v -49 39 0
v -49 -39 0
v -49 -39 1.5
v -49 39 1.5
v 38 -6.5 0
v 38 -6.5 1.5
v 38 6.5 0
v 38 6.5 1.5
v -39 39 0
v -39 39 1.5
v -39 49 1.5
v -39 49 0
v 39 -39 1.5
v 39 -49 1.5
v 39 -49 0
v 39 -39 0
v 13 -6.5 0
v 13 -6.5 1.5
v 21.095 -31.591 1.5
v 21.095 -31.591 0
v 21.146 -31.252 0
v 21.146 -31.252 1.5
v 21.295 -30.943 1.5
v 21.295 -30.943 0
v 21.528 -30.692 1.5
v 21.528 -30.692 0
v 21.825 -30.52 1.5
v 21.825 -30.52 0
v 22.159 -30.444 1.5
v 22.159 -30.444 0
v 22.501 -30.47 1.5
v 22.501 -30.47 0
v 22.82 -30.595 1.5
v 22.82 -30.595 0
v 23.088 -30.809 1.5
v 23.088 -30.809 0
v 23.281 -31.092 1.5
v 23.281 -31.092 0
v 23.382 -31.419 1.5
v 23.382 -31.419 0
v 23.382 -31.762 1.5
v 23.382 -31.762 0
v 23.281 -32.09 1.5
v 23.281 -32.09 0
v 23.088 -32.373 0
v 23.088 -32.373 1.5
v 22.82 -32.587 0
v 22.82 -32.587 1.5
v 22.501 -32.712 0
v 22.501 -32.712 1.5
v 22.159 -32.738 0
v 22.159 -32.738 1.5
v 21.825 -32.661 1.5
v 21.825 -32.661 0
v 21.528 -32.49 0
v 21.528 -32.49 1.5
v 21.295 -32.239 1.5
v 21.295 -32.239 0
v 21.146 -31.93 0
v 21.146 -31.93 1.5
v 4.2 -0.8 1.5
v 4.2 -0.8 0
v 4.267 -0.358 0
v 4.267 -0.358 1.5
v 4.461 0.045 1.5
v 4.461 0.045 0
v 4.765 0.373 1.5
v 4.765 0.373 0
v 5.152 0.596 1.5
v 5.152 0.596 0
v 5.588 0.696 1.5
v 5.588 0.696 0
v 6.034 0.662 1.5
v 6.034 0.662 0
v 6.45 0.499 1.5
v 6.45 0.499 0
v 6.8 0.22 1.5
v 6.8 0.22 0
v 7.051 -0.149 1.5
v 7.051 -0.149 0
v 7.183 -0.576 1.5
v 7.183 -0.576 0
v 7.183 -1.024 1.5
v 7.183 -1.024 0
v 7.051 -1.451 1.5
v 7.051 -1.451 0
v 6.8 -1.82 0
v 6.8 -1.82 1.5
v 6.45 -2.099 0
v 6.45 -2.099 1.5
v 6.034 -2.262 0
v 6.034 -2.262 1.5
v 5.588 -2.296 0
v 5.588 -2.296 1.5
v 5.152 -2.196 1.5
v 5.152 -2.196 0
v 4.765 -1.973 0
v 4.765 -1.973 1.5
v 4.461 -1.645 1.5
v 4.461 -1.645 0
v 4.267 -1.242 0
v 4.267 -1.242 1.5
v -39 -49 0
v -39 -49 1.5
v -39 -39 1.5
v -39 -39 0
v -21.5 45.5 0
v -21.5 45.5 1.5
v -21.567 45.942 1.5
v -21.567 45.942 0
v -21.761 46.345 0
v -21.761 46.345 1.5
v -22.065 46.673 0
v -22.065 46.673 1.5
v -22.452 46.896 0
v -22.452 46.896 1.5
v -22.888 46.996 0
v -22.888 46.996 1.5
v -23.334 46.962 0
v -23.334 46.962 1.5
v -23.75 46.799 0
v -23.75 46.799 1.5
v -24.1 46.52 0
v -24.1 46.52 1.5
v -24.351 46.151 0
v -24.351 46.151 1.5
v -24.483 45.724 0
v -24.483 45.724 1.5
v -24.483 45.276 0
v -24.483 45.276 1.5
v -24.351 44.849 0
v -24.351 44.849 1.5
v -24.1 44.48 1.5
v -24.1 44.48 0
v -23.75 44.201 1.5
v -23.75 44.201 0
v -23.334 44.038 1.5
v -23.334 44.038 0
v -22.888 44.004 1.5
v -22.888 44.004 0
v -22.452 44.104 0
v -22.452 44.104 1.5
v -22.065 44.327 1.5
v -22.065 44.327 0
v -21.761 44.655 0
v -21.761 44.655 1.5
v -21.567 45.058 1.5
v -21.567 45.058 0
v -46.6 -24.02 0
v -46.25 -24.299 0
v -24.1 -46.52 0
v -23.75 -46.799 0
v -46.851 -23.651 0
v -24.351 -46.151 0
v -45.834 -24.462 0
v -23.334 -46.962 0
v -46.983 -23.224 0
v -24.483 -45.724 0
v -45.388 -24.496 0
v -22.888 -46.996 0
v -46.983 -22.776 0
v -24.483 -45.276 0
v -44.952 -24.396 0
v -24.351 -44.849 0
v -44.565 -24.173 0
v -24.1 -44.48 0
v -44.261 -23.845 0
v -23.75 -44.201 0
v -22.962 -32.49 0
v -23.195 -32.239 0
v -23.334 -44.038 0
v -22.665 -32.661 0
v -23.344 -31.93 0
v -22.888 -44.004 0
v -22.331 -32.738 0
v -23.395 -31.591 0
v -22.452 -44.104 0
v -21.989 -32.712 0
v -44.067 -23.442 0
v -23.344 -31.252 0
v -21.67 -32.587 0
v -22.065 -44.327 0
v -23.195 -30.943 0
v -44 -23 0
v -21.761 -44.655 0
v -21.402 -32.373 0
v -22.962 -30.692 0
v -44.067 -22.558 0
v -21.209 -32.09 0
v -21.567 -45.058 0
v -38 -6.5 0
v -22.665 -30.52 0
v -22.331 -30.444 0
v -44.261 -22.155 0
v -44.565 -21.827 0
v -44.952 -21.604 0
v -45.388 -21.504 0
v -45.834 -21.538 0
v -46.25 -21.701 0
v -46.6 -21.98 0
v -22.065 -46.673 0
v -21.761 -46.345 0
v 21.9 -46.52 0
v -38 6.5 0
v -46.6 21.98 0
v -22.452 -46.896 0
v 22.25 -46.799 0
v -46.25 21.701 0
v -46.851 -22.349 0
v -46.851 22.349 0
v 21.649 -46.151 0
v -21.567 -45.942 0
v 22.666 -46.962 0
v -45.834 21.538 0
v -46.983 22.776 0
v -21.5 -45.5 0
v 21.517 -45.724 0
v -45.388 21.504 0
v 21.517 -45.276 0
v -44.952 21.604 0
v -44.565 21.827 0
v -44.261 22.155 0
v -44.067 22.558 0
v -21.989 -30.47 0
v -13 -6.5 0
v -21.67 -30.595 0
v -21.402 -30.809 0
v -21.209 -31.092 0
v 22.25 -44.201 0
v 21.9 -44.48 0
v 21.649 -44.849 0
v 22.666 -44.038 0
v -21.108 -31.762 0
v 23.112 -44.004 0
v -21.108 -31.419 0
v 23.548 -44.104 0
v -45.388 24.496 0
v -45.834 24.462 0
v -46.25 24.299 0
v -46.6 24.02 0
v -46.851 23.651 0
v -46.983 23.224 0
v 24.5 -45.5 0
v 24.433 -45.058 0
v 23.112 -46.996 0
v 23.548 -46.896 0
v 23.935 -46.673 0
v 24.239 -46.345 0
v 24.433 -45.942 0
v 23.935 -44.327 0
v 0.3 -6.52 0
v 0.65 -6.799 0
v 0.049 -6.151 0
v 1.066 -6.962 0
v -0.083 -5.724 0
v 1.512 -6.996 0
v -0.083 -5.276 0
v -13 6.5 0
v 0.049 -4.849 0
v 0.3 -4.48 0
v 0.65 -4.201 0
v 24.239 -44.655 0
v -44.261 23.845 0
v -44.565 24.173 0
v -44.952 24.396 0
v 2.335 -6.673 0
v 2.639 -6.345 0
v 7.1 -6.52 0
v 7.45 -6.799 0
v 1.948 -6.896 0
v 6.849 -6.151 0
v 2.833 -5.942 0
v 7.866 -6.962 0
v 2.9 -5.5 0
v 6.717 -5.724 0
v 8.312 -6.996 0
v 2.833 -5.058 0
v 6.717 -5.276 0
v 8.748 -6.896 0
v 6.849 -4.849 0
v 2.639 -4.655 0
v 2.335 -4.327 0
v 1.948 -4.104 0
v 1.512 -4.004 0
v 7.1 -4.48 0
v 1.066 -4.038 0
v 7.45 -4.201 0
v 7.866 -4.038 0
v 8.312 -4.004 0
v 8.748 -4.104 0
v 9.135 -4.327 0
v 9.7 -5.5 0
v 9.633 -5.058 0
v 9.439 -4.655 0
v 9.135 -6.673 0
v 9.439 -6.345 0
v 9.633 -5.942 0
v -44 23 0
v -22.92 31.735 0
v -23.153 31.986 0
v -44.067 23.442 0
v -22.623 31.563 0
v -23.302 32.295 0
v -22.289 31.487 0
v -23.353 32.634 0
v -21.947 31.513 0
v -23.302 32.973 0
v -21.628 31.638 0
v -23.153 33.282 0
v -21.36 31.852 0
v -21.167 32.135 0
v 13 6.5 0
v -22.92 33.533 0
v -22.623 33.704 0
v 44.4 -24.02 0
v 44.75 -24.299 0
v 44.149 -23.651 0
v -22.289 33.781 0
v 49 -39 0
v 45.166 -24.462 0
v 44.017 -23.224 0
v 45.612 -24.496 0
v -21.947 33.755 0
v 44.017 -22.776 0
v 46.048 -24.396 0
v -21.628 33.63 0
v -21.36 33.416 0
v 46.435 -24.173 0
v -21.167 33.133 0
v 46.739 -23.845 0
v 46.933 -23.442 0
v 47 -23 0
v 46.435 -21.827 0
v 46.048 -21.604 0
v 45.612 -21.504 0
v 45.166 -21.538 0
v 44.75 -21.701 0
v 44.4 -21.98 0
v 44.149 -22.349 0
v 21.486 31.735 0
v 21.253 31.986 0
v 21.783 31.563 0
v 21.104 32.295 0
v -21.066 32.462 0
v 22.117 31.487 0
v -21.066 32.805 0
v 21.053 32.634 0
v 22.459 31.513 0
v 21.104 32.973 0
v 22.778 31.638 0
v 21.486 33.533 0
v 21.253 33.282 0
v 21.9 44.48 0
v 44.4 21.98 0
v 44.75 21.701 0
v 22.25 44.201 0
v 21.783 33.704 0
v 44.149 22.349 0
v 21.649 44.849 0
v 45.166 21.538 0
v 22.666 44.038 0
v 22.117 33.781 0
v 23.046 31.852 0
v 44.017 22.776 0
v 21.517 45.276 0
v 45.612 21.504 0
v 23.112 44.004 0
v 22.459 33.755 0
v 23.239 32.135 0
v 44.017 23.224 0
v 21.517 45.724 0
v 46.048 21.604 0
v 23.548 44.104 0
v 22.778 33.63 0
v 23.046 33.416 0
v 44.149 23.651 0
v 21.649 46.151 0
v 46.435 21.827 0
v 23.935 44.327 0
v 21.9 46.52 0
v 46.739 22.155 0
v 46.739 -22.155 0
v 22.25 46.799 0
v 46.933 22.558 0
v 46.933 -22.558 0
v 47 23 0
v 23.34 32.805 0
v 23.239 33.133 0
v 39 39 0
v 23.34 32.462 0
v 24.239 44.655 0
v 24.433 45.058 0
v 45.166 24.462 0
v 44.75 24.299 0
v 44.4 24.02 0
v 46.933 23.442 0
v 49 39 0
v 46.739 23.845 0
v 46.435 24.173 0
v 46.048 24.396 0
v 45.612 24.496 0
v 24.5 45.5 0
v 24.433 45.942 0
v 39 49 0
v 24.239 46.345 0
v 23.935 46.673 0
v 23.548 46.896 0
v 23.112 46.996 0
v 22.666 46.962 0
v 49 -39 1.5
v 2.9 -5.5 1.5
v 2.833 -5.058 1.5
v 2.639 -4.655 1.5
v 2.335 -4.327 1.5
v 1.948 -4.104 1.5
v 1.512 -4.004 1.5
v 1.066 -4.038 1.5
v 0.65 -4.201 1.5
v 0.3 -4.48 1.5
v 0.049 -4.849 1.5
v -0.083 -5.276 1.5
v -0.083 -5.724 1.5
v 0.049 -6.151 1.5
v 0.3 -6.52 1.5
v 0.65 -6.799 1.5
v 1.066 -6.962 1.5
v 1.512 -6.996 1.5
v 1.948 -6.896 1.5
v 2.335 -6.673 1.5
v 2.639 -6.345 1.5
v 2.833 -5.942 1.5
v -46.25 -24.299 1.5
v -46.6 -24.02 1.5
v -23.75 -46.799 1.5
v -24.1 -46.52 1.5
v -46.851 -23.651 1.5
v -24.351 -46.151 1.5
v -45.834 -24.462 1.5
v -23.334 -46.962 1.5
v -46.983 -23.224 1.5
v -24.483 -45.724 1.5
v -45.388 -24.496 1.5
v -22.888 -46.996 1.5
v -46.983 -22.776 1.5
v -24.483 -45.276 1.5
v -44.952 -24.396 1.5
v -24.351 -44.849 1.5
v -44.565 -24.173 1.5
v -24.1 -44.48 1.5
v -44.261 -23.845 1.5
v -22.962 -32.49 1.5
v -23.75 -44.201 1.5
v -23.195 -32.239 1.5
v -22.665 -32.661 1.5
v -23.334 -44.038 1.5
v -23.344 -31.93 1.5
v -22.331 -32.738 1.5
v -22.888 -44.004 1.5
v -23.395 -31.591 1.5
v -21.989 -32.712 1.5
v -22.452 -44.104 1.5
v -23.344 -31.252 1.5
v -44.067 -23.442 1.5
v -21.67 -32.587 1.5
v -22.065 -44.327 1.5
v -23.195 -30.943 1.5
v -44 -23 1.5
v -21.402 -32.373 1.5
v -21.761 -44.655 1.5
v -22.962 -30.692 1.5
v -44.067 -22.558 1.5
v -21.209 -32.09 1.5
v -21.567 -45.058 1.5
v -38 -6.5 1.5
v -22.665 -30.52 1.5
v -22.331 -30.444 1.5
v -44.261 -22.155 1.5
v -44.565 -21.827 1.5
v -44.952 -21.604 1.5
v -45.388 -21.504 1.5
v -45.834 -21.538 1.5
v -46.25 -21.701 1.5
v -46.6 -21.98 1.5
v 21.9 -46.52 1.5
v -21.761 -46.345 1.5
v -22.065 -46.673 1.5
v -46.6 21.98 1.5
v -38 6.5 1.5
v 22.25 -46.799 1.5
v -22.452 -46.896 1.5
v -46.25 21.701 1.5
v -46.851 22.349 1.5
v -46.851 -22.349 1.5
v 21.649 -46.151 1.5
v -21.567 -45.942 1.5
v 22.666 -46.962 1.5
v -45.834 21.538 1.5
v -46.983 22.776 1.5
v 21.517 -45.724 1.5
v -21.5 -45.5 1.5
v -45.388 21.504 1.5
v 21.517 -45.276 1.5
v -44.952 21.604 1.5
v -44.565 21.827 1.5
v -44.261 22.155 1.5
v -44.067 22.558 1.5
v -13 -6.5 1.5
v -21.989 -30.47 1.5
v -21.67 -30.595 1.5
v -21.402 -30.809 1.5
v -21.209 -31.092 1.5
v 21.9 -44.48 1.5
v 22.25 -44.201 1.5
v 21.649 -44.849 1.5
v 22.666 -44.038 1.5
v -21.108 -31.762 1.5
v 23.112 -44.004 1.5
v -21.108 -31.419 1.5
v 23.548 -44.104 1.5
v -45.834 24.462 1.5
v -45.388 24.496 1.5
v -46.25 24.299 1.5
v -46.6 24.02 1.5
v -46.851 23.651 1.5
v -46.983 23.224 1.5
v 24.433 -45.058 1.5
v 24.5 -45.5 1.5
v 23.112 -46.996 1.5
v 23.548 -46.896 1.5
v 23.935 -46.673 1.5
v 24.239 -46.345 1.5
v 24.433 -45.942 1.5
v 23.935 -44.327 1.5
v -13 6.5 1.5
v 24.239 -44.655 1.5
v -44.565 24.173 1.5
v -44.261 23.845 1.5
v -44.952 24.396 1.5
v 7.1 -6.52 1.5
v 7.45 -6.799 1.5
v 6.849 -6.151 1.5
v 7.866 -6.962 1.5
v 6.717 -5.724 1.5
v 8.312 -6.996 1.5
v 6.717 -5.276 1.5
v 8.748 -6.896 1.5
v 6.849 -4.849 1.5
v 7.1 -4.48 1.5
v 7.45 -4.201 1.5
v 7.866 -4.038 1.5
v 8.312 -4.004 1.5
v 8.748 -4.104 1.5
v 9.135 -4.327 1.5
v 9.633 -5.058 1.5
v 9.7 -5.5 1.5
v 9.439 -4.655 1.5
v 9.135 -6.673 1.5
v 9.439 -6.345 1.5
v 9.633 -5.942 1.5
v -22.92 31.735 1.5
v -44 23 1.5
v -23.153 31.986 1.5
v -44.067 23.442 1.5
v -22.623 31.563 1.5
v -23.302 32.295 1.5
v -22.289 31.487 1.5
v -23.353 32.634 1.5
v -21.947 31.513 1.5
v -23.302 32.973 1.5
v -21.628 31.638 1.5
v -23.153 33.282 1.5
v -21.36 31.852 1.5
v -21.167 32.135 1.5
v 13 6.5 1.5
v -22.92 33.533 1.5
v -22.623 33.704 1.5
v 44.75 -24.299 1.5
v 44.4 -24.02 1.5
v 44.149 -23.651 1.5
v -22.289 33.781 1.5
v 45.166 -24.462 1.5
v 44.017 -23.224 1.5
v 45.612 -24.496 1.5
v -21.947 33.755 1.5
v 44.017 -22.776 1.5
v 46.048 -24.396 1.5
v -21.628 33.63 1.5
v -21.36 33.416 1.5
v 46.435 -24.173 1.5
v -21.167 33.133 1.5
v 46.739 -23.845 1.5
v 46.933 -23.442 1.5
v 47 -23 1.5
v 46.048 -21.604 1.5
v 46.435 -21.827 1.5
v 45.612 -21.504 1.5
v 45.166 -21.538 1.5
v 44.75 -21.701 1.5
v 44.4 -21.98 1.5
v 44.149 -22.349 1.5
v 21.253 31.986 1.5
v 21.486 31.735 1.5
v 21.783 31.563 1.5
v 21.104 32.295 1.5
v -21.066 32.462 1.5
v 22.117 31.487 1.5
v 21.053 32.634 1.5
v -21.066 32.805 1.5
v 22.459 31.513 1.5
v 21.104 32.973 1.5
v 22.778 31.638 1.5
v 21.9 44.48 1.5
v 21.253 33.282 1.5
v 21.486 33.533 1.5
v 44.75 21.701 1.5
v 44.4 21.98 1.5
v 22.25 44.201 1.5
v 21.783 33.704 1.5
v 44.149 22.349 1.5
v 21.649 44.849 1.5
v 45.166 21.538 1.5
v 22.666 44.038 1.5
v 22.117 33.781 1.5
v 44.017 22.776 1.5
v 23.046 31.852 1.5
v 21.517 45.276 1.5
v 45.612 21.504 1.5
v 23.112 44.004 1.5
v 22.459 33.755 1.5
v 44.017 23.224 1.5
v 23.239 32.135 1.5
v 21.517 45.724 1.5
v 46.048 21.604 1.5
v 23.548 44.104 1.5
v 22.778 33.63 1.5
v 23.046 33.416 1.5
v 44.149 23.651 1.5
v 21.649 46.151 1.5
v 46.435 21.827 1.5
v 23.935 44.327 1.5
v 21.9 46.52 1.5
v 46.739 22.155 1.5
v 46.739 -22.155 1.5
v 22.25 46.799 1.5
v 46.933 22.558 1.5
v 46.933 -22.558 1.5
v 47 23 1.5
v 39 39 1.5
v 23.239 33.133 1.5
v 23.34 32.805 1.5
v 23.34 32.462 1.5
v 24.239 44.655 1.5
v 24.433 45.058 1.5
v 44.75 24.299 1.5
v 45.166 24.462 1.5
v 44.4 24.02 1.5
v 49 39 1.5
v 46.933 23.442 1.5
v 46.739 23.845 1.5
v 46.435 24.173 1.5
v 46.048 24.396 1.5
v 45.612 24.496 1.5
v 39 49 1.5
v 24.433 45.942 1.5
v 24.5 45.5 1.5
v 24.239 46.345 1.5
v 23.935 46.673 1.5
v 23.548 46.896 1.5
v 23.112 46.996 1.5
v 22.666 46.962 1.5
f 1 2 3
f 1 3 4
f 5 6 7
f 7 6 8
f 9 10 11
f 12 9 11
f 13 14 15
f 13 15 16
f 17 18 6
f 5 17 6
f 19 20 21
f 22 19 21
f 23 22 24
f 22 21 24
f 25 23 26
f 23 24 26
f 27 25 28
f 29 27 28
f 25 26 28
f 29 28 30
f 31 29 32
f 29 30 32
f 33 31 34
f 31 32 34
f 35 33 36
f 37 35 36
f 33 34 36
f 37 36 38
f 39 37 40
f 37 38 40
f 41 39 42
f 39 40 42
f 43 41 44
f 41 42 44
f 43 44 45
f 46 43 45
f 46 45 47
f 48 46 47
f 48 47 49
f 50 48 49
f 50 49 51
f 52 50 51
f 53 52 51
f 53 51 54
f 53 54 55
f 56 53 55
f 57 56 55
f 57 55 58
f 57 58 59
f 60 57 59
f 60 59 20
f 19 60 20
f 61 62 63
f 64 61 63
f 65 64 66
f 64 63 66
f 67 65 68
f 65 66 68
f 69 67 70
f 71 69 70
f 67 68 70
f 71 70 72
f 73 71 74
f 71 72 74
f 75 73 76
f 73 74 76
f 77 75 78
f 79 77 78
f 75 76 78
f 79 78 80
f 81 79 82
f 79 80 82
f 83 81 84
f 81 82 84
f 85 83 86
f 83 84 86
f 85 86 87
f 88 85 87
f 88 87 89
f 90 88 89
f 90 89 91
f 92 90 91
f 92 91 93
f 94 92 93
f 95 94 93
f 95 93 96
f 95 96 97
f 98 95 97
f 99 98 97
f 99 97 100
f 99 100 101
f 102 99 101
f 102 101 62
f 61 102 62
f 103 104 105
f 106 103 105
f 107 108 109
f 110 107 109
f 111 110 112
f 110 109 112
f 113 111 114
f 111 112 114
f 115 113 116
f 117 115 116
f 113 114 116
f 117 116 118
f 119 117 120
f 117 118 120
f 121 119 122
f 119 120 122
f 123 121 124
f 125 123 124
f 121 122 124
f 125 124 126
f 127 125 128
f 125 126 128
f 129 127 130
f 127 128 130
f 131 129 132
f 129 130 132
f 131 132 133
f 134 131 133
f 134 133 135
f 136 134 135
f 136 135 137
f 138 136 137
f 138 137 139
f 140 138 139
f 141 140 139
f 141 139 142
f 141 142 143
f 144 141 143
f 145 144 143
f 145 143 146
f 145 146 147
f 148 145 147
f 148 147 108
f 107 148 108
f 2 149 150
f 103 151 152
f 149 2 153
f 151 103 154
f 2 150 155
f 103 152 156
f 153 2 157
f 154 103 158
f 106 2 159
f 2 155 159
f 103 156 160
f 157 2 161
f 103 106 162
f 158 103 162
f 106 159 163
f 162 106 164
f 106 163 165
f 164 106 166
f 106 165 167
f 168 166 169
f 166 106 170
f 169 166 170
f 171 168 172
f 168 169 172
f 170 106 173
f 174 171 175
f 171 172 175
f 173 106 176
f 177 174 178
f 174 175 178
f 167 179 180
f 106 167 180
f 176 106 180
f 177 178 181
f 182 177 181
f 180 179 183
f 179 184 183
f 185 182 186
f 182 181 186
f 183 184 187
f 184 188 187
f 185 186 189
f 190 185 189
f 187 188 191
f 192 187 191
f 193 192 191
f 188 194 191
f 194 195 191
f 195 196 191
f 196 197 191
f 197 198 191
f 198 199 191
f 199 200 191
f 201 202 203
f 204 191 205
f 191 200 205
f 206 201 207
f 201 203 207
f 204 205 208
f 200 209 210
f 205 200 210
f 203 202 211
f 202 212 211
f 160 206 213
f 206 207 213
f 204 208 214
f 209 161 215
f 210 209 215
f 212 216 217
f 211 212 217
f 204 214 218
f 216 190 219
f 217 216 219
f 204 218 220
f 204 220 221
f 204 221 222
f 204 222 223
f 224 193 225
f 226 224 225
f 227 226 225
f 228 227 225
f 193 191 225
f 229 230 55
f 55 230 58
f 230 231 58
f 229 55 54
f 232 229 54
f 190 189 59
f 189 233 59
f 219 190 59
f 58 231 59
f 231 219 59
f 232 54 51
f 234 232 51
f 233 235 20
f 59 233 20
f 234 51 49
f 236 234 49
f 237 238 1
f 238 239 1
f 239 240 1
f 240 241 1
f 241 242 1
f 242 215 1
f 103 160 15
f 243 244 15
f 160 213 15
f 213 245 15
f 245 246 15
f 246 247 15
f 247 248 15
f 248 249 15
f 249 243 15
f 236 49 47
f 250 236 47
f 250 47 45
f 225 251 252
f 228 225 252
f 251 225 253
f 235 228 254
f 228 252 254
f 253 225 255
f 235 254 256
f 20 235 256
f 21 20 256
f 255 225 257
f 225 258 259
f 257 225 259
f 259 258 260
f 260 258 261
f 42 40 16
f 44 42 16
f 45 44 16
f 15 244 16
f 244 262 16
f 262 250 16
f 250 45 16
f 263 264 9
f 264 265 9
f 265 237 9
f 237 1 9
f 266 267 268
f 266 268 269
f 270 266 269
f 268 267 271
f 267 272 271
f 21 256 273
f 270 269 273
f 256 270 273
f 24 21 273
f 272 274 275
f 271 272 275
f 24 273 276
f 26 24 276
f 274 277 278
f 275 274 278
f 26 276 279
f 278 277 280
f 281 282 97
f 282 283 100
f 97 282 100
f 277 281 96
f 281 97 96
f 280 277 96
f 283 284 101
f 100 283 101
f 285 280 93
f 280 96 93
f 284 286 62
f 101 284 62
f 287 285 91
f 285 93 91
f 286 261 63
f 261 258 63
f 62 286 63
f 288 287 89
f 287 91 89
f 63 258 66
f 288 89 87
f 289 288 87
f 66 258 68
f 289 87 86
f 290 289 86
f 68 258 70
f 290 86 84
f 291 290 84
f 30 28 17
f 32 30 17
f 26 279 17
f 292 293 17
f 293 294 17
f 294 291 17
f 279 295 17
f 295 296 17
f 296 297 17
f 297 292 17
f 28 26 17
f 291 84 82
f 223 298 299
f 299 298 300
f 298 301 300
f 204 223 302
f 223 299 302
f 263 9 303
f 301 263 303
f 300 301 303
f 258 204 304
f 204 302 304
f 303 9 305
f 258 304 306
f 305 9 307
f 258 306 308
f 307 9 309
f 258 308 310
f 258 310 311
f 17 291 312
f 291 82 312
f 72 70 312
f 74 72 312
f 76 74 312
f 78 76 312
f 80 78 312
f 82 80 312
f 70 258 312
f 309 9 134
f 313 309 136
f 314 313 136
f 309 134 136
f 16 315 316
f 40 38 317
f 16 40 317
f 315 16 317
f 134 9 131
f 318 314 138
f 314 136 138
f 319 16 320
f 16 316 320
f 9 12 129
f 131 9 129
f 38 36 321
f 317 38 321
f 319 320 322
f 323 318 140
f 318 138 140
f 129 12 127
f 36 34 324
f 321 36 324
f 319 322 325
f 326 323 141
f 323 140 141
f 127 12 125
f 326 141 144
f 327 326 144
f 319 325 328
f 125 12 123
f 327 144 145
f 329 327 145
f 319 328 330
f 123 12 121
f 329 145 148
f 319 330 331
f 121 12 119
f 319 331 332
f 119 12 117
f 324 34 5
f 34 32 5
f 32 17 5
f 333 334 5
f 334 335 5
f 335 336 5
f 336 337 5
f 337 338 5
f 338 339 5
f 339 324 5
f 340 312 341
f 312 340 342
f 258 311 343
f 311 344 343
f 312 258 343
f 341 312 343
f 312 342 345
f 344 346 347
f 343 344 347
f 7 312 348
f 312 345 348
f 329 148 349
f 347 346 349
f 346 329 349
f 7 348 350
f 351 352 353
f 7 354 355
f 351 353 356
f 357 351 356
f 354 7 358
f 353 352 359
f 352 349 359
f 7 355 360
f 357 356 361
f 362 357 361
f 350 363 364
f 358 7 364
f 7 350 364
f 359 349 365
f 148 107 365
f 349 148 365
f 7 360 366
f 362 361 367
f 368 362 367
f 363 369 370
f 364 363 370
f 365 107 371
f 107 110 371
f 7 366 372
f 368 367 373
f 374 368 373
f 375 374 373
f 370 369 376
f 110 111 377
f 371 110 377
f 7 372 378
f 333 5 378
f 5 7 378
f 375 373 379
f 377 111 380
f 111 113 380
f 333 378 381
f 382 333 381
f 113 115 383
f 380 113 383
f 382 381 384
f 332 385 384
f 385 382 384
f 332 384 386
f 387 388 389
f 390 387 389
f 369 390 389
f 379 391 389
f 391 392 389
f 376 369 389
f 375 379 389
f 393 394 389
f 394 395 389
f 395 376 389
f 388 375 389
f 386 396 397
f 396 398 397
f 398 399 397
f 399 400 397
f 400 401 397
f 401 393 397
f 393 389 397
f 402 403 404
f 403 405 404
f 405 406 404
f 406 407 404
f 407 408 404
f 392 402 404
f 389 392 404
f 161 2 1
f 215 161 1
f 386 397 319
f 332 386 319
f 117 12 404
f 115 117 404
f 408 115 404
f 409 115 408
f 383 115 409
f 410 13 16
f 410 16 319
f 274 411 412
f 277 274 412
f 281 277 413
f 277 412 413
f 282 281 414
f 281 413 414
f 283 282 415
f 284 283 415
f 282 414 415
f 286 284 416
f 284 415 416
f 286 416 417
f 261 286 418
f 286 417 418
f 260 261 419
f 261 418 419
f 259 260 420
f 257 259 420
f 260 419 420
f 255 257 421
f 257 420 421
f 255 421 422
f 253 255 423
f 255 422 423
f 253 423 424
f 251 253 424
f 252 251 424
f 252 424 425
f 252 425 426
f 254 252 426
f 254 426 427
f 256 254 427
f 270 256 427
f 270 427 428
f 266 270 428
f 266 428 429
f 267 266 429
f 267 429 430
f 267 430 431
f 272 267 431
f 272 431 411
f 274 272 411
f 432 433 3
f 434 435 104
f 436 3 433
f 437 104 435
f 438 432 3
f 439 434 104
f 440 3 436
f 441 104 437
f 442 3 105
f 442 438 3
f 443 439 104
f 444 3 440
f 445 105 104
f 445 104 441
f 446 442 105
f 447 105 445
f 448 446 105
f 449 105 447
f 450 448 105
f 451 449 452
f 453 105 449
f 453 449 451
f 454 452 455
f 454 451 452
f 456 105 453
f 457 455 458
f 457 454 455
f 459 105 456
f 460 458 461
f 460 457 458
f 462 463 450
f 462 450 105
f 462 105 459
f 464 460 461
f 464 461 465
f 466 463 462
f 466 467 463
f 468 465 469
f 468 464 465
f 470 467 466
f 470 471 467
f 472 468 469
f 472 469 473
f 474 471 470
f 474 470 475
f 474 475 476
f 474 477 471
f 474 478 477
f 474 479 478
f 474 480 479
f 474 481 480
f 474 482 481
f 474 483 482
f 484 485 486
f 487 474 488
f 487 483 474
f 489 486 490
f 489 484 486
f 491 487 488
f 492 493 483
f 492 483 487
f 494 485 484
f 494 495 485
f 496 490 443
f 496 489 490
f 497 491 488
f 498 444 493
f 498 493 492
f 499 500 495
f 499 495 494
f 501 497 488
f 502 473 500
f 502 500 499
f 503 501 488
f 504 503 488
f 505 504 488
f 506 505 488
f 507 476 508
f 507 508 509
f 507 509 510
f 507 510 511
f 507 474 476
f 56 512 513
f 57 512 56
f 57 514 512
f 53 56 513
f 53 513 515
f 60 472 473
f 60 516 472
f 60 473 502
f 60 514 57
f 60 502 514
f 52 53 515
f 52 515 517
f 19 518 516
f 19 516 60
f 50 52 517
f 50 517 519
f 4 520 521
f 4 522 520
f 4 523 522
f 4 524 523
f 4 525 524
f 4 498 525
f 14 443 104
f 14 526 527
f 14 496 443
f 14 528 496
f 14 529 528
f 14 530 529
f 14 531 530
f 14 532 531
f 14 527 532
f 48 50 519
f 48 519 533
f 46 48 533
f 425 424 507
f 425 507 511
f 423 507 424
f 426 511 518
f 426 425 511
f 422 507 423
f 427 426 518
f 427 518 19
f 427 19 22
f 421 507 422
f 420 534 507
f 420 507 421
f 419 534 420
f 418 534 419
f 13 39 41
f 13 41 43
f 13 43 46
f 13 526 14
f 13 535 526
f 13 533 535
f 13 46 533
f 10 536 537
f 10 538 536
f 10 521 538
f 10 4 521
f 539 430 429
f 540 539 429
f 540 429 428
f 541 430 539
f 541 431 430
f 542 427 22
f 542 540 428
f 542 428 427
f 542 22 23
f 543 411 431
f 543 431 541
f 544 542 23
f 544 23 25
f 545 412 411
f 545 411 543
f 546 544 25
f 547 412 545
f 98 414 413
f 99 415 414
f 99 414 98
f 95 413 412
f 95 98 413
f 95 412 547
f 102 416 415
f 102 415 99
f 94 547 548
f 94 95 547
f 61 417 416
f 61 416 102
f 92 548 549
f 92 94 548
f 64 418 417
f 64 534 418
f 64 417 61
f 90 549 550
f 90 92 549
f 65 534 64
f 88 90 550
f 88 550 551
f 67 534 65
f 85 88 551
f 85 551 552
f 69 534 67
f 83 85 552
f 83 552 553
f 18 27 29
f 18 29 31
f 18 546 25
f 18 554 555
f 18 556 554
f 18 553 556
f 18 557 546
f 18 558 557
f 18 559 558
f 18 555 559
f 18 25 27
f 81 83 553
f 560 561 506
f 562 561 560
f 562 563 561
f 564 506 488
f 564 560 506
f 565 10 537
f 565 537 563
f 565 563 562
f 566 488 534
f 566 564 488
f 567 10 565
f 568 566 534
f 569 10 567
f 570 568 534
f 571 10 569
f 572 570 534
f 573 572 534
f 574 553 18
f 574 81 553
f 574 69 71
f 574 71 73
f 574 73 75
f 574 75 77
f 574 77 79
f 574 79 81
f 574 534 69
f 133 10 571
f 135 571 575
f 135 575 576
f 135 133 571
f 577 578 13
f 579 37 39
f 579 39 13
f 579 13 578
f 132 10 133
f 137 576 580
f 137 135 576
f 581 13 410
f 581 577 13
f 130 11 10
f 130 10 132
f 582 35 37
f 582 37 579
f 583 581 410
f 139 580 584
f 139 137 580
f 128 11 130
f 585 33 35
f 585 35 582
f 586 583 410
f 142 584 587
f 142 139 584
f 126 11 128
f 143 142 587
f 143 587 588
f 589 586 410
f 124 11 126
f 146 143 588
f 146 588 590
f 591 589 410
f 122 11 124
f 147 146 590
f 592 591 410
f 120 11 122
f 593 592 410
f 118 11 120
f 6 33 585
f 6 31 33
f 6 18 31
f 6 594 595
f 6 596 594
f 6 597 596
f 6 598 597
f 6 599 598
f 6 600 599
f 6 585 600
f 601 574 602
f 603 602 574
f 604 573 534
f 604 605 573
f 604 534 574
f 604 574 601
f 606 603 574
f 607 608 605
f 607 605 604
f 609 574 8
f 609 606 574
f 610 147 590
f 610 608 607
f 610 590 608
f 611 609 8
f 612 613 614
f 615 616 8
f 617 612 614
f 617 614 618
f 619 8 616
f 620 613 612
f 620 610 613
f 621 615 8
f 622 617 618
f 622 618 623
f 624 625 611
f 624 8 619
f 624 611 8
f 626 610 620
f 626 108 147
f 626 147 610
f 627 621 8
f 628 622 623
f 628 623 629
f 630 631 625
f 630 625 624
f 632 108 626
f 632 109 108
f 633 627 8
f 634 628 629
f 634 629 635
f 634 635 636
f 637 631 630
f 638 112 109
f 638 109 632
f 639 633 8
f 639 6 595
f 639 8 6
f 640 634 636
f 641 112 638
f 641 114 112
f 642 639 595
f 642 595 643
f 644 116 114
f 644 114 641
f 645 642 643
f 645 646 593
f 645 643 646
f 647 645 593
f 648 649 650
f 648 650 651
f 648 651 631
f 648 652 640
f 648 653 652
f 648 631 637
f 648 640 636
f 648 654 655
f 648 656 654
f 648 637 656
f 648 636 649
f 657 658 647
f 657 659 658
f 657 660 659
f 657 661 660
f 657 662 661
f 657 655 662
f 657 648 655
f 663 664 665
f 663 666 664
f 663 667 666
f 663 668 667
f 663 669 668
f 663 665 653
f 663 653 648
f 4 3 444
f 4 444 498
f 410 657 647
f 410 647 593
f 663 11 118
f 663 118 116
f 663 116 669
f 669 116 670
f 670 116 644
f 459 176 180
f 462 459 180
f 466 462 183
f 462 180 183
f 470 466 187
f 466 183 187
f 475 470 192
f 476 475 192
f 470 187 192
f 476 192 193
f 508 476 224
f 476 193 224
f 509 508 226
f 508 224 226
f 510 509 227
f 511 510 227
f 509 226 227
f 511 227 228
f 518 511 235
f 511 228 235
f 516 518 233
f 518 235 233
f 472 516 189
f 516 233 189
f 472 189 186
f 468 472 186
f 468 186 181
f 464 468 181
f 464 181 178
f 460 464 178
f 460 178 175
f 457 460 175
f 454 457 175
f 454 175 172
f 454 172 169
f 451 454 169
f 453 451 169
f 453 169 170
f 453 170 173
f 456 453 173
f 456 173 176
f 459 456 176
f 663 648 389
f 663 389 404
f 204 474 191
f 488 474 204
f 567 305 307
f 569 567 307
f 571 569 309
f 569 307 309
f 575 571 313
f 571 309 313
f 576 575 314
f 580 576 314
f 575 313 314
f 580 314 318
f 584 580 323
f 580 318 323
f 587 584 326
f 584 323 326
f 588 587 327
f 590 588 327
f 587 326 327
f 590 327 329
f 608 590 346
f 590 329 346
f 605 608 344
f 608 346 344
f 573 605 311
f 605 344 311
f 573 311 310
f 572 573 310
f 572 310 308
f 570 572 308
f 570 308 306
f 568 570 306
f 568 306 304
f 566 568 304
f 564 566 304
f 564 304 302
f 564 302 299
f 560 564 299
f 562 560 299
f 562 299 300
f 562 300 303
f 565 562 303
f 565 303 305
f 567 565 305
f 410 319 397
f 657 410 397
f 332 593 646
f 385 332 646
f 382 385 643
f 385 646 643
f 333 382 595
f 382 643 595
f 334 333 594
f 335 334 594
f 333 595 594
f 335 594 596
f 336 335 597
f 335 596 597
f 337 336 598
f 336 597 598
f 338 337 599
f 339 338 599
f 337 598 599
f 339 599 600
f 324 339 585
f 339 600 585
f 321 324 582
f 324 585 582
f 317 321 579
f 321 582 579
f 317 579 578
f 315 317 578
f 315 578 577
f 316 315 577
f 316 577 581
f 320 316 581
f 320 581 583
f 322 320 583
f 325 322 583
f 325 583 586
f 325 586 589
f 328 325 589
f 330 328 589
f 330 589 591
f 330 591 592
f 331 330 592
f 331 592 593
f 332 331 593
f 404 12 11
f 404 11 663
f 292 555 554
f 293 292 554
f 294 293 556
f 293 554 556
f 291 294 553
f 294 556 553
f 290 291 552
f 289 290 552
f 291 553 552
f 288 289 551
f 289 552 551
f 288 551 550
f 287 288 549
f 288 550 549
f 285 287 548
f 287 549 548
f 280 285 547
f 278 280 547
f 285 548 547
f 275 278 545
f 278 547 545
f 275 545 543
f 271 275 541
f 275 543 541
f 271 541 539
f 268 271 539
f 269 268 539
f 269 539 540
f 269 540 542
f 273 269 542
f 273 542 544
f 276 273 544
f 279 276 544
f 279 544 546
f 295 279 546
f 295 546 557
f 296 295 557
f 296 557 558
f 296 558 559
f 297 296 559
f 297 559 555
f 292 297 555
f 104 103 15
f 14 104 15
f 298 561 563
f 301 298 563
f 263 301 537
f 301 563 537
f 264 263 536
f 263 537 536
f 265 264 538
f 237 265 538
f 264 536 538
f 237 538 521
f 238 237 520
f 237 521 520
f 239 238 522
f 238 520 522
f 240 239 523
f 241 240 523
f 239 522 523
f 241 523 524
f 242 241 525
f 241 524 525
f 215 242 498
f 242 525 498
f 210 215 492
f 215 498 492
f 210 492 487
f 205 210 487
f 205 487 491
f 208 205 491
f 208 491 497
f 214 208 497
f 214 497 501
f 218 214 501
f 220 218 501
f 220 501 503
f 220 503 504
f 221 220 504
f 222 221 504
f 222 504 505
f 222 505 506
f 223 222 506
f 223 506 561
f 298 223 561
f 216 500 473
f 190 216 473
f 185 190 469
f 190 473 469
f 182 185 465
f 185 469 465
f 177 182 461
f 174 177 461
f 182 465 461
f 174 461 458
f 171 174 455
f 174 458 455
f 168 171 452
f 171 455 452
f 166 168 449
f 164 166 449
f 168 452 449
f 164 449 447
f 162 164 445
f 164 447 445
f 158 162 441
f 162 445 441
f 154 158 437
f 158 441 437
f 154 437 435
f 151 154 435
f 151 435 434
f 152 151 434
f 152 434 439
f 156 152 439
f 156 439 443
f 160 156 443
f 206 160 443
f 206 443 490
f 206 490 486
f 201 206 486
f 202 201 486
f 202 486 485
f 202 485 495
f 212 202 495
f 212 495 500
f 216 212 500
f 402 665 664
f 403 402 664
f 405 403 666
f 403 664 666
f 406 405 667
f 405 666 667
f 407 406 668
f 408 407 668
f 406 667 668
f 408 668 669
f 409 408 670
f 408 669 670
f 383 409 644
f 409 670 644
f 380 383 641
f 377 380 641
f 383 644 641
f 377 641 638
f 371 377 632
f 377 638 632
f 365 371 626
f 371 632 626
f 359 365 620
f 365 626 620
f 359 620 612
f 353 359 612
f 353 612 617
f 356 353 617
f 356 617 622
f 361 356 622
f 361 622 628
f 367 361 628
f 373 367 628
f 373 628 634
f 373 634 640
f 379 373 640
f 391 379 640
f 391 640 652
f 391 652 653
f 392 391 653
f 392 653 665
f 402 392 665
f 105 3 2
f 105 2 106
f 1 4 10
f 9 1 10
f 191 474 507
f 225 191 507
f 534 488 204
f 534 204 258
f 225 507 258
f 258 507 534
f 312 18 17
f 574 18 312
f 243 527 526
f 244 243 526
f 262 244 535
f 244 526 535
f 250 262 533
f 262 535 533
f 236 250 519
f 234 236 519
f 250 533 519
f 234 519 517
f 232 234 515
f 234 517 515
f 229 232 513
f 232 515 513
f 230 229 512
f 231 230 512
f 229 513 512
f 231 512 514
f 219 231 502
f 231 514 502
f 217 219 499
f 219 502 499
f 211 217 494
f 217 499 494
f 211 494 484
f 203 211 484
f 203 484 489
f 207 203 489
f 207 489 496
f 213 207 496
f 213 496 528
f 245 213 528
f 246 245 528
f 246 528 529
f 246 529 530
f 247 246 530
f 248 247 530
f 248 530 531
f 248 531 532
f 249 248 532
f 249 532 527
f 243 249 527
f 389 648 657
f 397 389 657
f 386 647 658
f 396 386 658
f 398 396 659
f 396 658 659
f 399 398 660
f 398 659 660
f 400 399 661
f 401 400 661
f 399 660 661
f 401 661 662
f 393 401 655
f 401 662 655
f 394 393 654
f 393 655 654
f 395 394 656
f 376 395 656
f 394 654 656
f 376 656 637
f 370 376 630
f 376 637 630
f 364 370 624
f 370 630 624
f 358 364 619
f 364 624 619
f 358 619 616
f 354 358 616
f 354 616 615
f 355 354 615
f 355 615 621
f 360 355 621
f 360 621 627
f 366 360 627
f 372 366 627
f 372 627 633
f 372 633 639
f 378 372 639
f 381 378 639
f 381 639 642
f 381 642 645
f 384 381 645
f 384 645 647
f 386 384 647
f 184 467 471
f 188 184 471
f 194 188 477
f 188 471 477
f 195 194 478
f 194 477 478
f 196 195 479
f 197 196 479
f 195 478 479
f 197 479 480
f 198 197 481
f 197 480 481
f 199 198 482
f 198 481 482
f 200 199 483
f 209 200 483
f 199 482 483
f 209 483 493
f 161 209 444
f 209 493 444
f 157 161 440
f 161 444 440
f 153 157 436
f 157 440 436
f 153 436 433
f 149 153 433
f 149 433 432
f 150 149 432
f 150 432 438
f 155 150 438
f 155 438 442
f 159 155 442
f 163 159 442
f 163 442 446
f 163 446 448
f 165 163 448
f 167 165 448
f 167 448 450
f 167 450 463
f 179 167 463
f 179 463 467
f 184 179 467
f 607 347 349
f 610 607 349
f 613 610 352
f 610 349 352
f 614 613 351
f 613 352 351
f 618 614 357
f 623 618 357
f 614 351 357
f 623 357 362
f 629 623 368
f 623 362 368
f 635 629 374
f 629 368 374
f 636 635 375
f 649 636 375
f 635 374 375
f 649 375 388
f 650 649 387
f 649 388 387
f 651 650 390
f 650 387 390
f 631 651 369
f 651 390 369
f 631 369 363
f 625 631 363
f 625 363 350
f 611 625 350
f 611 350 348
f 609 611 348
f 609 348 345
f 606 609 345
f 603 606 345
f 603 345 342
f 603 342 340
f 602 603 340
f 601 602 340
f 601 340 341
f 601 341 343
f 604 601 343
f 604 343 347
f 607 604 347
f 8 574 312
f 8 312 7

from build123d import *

# Parameters (mm, degrees)
SKETCH1_W                      = 98
SKETCH1_H                      = 98
BOSS_EXTRUDE1_DEPTH            = 1.5
SKETCH2_W                      = 10
SKETCH2_H                      = 10
CUT_EXTRUDE1_DEPTH             = 10
F_3_0_3_DIAMETER_HOLE1_D       = 3
SKETCH5_W                      = 25
SKETCH5_H                      = 13
CUT_EXTRUDE2_DEPTH             = 10
F_2_3_2_3_DIAMETER_HOLE1_D     = 2.3
F_2_3_2_3_DIAMETER_HOLE1_DEPTH = 30
SKETCH8_R                      = 1.5
CUT_EXTRUDE3_DEPTH             = 10
F_3_0_3_DIAMETER_HOLE2_D       = 3
F_3_0_3_DIAMETER_HOLE2_DEPTH   = 6.5


with BuildPart() as part:
    # Sketch1 → Boss-Extrude1 (new body)
    with BuildSketch(Plane.XY):
        Rectangle(SKETCH1_W, SKETCH1_H)
    extrude(amount=BOSS_EXTRUDE1_DEPTH)

    # Sketch2 → Cut-Extrude1 (cut)
    with BuildSketch(Plane.XY.offset(1.5)):
        with Locations((-44, 44)):
            Rectangle(SKETCH2_W, SKETCH2_H)
        with Locations((44, 44)):
            Rectangle(SKETCH2_W, SKETCH2_H)
        with Locations((44, -44)):
            Rectangle(SKETCH2_W, SKETCH2_H)
        with Locations((-44, -44)):
            Rectangle(SKETCH2_W, SKETCH2_H)
    extrude(amount=-CUT_EXTRUDE1_DEPTH, mode=Mode.SUBTRACT)

    # Ø3.0 (3) Diameter Hole1 (through all)
    with Locations(Plane(origin=(0, 0, 0), x_dir=(-1, 0, 0), z_dir=(0, 0, -1))):
        with Locations((-23, 45.5), (23, 45.5), (45.5, 23), (45.5, -23), (23, -45.5), (-23, -45.5), (-45.5, -23), (-45.5, 23)):
            Hole(F_3_0_3_DIAMETER_HOLE1_D / 2)

    # Sketch5 → Cut-Extrude2 (cut)
    with BuildSketch(Plane.XY.offset(1.5)):
        with Locations((-25.5, 0)):
            Rectangle(SKETCH5_W, SKETCH5_H)
        with Locations((25.5, 0)):
            Rectangle(SKETCH5_W, SKETCH5_H)
    extrude(amount=-CUT_EXTRUDE2_DEPTH, mode=Mode.SUBTRACT)

    # Ø2.3 (2.3) Diameter Hole1
    with Locations(Plane.XY.offset(1.5)):
        with Locations((-22.24500144, -31.590736692), (-22.203117232, 32.633806534), (22.203117232, 32.633806534), (22.24500144, -31.590736692)):
            Hole(F_2_3_2_3_DIAMETER_HOLE1_D / 2, depth=F_2_3_2_3_DIAMETER_HOLE1_DEPTH)

    # Sketch8 → Cut-Extrude3 (cut)
    with BuildSketch(Plane(origin=(0, 0, 0), x_dir=(-1, 0, 0), z_dir=(0, 0, -1))):
        with Locations((-5.7, -0.8)):
            Circle(SKETCH8_R)
    extrude(amount=-CUT_EXTRUDE3_DEPTH, mode=Mode.SUBTRACT)

    # Ø3.0 (3) Diameter Hole2
    with Locations(Plane(origin=(0, 0, 0), x_dir=(-1, 0, 0), z_dir=(0, 0, -1))):
        with Locations((-1.4, -5.5), (-8.2, -5.5)):
            Hole(F_3_0_3_DIAMETER_HOLE2_D / 2, depth=F_3_0_3_DIAMETER_HOLE2_DEPTH)


solid = part.part
